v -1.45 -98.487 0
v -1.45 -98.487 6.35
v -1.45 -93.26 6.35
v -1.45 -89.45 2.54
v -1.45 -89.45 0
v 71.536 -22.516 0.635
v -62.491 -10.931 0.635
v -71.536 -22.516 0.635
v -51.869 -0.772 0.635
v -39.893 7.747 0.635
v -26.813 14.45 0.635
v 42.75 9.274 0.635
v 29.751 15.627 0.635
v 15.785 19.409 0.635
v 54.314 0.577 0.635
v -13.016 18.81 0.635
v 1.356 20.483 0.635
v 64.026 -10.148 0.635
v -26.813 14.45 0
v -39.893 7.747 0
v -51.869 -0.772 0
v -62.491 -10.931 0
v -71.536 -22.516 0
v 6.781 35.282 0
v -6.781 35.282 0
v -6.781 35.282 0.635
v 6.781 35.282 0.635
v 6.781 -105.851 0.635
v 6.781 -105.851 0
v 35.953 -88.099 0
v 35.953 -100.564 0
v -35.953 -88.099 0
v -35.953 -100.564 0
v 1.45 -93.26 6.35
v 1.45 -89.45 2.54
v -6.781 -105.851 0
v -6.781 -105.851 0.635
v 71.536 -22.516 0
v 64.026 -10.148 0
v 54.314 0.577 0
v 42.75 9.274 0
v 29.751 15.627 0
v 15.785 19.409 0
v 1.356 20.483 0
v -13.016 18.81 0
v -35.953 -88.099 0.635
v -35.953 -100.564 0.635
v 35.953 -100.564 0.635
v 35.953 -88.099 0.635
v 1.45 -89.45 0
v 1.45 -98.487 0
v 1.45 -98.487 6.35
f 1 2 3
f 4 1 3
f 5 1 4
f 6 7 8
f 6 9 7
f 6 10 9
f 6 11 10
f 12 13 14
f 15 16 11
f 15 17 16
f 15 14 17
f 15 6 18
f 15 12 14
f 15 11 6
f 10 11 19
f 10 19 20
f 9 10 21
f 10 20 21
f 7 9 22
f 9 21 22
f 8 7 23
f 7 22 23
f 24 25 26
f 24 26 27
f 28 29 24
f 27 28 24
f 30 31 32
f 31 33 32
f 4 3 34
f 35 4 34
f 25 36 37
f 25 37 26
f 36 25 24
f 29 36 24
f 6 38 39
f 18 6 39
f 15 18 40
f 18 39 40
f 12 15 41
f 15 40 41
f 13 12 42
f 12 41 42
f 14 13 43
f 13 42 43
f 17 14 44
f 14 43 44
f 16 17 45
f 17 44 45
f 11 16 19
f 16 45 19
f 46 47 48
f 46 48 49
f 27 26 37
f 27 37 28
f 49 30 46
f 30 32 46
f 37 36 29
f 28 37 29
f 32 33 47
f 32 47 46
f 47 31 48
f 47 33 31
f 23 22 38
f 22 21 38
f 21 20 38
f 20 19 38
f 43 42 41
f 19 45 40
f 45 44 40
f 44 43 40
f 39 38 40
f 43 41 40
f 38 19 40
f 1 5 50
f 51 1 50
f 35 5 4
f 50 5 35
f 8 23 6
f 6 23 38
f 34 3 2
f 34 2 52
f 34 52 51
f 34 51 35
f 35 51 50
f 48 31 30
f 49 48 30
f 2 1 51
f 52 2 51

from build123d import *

# Parameters (mm, degrees)
F0_W        = 143.0713832378
F0_H        = 45.0311638415
F4_DEPTH    = 0.635
F3_W        = 2.8990160208
F3_H        = 9.0372115374
F5_DEPTH    = 6.35
F1_W        = 13.562570326
F1_H        = 141.1334902227
F6_DEPTH    = 0.635
F2_W        = 33.8059067726
F2_H        = 12.464389205
F7_T1_DEPTH = 422.6103184628
F8_T1_DEPTH = 494.0274907259
F9_SIZE     = 3.81
F10_DEPTH   = 19.05
F11_DEPTH   = 19.05


# Not quite as in the source:
# - a fillet or chamfer that OpenCascade refuses, or shapes differently, is made with other operations: its cross-section is extruded or revolved along the edge and cut away or added


with BuildPart() as f4:
    # F0 (on Top) → F4 (new body)
    with BuildSketch(Plane.XY):
        Rectangle(F0_W, F0_H)
    extrude(amount=F4_DEPTH)

    # F7: fillet of radius 101.6 on 1 edges, made by hand

    # F7_s2 → F7_t1 (cut)
    with BuildSketch(Plane.XY.offset(-210.9876592314)):
        with BuildLine():
            ThreePointArc((12.8593720736, 22.5155819207), (-34.969313076, 10.5536144563), (-71.5356916189, -22.5155819207))
            Line((-71.5356916189, -22.5155819207), (-71.5356916189, 22.5155819207))
            Line((-71.5356916189, 22.5155819207), (12.8593720736, 22.5155819207))
        make_face()
    extrude(amount=F7_T1_DEPTH, mode=Mode.SUBTRACT)

    # F8: fillet of radius 76.2 on 1 edges, made by hand

    # F8_s2 → F8_t1 (cut)
    with BuildSketch(Plane.XY.offset(-246.696245363)):
        with BuildLine():
            ThreePointArc((71.5356916189, -22.5155819207), (29.7510071905, 15.6271915076), (-26.8126321644, 14.4500252009))
            Line((-26.8126321644, 14.4500252009), (-29.7880324822, 21.4651084469))
            ThreePointArc((-29.7880324822, 21.4651084469), (12.8593720736, 30.1355819207), (71.5356916189, 30.1355819207))
            Line((71.5356916189, 30.1355819207), (79.1556916189, 22.5155819207))
            ThreePointArc((79.1556916189, 22.5155819207), (79.1556916189, 0), (78.3951236794, -19.1970593869))
            Line((78.3951236794, -19.1970593869), (71.5356916189, -22.5155819207))
        make_face()
    extrude(amount=F8_T1_DEPTH, mode=Mode.SUBTRACT)


with BuildPart() as f5:
    # F3 (on Top) → F5 (new body)
    with BuildSketch(Plane.XY):
        with Locations((0, -93.9688310027)):
            Rectangle(F3_W, F3_H)
    extrude(amount=F5_DEPTH)

    # F9
    f9_edges = [f5.edges().sort_by_distance(p)[0] for p in [
        (0, -89.450225, 6.35),
    ]]
    chamfer(f9_edges, length=F9_SIZE)


with BuildPart() as f6:
    # F1 (on Top) → F6 (new body)
    with BuildSketch(Plane.XY):
        with Locations((0, -35.2845847517)):
            Rectangle(F1_W, F1_H)
    extrude(amount=F6_DEPTH)


with BuildPart() as f6b:
    # F2 (on Top) → F6, piece 2 (new body)
    with BuildSketch(Plane.XY):
        with Locations((0, -94.3314284086)):
            Rectangle(F2_W, F2_H)
    extrude(amount=F6_DEPTH)

    # F10 (add): a face of the model
    f10_faces = [f6b.faces().sort_by_distance(p)[0] for p in [
        (-16.9029533863, -94.3314284086, 0.3175),
    ]]
    extrude(f10_faces, amount=F10_DEPTH)

    # F11 (add): a face of the model
    f11_faces = [f6b.faces().sort_by_distance(p)[0] for p in [
        (16.9029533863, -94.3314284086, 0.3175),
    ]]
    extrude(f11_faces, amount=F11_DEPTH)


solid = Compound([f4.part, f5.part, f6.part, f6b.part])
